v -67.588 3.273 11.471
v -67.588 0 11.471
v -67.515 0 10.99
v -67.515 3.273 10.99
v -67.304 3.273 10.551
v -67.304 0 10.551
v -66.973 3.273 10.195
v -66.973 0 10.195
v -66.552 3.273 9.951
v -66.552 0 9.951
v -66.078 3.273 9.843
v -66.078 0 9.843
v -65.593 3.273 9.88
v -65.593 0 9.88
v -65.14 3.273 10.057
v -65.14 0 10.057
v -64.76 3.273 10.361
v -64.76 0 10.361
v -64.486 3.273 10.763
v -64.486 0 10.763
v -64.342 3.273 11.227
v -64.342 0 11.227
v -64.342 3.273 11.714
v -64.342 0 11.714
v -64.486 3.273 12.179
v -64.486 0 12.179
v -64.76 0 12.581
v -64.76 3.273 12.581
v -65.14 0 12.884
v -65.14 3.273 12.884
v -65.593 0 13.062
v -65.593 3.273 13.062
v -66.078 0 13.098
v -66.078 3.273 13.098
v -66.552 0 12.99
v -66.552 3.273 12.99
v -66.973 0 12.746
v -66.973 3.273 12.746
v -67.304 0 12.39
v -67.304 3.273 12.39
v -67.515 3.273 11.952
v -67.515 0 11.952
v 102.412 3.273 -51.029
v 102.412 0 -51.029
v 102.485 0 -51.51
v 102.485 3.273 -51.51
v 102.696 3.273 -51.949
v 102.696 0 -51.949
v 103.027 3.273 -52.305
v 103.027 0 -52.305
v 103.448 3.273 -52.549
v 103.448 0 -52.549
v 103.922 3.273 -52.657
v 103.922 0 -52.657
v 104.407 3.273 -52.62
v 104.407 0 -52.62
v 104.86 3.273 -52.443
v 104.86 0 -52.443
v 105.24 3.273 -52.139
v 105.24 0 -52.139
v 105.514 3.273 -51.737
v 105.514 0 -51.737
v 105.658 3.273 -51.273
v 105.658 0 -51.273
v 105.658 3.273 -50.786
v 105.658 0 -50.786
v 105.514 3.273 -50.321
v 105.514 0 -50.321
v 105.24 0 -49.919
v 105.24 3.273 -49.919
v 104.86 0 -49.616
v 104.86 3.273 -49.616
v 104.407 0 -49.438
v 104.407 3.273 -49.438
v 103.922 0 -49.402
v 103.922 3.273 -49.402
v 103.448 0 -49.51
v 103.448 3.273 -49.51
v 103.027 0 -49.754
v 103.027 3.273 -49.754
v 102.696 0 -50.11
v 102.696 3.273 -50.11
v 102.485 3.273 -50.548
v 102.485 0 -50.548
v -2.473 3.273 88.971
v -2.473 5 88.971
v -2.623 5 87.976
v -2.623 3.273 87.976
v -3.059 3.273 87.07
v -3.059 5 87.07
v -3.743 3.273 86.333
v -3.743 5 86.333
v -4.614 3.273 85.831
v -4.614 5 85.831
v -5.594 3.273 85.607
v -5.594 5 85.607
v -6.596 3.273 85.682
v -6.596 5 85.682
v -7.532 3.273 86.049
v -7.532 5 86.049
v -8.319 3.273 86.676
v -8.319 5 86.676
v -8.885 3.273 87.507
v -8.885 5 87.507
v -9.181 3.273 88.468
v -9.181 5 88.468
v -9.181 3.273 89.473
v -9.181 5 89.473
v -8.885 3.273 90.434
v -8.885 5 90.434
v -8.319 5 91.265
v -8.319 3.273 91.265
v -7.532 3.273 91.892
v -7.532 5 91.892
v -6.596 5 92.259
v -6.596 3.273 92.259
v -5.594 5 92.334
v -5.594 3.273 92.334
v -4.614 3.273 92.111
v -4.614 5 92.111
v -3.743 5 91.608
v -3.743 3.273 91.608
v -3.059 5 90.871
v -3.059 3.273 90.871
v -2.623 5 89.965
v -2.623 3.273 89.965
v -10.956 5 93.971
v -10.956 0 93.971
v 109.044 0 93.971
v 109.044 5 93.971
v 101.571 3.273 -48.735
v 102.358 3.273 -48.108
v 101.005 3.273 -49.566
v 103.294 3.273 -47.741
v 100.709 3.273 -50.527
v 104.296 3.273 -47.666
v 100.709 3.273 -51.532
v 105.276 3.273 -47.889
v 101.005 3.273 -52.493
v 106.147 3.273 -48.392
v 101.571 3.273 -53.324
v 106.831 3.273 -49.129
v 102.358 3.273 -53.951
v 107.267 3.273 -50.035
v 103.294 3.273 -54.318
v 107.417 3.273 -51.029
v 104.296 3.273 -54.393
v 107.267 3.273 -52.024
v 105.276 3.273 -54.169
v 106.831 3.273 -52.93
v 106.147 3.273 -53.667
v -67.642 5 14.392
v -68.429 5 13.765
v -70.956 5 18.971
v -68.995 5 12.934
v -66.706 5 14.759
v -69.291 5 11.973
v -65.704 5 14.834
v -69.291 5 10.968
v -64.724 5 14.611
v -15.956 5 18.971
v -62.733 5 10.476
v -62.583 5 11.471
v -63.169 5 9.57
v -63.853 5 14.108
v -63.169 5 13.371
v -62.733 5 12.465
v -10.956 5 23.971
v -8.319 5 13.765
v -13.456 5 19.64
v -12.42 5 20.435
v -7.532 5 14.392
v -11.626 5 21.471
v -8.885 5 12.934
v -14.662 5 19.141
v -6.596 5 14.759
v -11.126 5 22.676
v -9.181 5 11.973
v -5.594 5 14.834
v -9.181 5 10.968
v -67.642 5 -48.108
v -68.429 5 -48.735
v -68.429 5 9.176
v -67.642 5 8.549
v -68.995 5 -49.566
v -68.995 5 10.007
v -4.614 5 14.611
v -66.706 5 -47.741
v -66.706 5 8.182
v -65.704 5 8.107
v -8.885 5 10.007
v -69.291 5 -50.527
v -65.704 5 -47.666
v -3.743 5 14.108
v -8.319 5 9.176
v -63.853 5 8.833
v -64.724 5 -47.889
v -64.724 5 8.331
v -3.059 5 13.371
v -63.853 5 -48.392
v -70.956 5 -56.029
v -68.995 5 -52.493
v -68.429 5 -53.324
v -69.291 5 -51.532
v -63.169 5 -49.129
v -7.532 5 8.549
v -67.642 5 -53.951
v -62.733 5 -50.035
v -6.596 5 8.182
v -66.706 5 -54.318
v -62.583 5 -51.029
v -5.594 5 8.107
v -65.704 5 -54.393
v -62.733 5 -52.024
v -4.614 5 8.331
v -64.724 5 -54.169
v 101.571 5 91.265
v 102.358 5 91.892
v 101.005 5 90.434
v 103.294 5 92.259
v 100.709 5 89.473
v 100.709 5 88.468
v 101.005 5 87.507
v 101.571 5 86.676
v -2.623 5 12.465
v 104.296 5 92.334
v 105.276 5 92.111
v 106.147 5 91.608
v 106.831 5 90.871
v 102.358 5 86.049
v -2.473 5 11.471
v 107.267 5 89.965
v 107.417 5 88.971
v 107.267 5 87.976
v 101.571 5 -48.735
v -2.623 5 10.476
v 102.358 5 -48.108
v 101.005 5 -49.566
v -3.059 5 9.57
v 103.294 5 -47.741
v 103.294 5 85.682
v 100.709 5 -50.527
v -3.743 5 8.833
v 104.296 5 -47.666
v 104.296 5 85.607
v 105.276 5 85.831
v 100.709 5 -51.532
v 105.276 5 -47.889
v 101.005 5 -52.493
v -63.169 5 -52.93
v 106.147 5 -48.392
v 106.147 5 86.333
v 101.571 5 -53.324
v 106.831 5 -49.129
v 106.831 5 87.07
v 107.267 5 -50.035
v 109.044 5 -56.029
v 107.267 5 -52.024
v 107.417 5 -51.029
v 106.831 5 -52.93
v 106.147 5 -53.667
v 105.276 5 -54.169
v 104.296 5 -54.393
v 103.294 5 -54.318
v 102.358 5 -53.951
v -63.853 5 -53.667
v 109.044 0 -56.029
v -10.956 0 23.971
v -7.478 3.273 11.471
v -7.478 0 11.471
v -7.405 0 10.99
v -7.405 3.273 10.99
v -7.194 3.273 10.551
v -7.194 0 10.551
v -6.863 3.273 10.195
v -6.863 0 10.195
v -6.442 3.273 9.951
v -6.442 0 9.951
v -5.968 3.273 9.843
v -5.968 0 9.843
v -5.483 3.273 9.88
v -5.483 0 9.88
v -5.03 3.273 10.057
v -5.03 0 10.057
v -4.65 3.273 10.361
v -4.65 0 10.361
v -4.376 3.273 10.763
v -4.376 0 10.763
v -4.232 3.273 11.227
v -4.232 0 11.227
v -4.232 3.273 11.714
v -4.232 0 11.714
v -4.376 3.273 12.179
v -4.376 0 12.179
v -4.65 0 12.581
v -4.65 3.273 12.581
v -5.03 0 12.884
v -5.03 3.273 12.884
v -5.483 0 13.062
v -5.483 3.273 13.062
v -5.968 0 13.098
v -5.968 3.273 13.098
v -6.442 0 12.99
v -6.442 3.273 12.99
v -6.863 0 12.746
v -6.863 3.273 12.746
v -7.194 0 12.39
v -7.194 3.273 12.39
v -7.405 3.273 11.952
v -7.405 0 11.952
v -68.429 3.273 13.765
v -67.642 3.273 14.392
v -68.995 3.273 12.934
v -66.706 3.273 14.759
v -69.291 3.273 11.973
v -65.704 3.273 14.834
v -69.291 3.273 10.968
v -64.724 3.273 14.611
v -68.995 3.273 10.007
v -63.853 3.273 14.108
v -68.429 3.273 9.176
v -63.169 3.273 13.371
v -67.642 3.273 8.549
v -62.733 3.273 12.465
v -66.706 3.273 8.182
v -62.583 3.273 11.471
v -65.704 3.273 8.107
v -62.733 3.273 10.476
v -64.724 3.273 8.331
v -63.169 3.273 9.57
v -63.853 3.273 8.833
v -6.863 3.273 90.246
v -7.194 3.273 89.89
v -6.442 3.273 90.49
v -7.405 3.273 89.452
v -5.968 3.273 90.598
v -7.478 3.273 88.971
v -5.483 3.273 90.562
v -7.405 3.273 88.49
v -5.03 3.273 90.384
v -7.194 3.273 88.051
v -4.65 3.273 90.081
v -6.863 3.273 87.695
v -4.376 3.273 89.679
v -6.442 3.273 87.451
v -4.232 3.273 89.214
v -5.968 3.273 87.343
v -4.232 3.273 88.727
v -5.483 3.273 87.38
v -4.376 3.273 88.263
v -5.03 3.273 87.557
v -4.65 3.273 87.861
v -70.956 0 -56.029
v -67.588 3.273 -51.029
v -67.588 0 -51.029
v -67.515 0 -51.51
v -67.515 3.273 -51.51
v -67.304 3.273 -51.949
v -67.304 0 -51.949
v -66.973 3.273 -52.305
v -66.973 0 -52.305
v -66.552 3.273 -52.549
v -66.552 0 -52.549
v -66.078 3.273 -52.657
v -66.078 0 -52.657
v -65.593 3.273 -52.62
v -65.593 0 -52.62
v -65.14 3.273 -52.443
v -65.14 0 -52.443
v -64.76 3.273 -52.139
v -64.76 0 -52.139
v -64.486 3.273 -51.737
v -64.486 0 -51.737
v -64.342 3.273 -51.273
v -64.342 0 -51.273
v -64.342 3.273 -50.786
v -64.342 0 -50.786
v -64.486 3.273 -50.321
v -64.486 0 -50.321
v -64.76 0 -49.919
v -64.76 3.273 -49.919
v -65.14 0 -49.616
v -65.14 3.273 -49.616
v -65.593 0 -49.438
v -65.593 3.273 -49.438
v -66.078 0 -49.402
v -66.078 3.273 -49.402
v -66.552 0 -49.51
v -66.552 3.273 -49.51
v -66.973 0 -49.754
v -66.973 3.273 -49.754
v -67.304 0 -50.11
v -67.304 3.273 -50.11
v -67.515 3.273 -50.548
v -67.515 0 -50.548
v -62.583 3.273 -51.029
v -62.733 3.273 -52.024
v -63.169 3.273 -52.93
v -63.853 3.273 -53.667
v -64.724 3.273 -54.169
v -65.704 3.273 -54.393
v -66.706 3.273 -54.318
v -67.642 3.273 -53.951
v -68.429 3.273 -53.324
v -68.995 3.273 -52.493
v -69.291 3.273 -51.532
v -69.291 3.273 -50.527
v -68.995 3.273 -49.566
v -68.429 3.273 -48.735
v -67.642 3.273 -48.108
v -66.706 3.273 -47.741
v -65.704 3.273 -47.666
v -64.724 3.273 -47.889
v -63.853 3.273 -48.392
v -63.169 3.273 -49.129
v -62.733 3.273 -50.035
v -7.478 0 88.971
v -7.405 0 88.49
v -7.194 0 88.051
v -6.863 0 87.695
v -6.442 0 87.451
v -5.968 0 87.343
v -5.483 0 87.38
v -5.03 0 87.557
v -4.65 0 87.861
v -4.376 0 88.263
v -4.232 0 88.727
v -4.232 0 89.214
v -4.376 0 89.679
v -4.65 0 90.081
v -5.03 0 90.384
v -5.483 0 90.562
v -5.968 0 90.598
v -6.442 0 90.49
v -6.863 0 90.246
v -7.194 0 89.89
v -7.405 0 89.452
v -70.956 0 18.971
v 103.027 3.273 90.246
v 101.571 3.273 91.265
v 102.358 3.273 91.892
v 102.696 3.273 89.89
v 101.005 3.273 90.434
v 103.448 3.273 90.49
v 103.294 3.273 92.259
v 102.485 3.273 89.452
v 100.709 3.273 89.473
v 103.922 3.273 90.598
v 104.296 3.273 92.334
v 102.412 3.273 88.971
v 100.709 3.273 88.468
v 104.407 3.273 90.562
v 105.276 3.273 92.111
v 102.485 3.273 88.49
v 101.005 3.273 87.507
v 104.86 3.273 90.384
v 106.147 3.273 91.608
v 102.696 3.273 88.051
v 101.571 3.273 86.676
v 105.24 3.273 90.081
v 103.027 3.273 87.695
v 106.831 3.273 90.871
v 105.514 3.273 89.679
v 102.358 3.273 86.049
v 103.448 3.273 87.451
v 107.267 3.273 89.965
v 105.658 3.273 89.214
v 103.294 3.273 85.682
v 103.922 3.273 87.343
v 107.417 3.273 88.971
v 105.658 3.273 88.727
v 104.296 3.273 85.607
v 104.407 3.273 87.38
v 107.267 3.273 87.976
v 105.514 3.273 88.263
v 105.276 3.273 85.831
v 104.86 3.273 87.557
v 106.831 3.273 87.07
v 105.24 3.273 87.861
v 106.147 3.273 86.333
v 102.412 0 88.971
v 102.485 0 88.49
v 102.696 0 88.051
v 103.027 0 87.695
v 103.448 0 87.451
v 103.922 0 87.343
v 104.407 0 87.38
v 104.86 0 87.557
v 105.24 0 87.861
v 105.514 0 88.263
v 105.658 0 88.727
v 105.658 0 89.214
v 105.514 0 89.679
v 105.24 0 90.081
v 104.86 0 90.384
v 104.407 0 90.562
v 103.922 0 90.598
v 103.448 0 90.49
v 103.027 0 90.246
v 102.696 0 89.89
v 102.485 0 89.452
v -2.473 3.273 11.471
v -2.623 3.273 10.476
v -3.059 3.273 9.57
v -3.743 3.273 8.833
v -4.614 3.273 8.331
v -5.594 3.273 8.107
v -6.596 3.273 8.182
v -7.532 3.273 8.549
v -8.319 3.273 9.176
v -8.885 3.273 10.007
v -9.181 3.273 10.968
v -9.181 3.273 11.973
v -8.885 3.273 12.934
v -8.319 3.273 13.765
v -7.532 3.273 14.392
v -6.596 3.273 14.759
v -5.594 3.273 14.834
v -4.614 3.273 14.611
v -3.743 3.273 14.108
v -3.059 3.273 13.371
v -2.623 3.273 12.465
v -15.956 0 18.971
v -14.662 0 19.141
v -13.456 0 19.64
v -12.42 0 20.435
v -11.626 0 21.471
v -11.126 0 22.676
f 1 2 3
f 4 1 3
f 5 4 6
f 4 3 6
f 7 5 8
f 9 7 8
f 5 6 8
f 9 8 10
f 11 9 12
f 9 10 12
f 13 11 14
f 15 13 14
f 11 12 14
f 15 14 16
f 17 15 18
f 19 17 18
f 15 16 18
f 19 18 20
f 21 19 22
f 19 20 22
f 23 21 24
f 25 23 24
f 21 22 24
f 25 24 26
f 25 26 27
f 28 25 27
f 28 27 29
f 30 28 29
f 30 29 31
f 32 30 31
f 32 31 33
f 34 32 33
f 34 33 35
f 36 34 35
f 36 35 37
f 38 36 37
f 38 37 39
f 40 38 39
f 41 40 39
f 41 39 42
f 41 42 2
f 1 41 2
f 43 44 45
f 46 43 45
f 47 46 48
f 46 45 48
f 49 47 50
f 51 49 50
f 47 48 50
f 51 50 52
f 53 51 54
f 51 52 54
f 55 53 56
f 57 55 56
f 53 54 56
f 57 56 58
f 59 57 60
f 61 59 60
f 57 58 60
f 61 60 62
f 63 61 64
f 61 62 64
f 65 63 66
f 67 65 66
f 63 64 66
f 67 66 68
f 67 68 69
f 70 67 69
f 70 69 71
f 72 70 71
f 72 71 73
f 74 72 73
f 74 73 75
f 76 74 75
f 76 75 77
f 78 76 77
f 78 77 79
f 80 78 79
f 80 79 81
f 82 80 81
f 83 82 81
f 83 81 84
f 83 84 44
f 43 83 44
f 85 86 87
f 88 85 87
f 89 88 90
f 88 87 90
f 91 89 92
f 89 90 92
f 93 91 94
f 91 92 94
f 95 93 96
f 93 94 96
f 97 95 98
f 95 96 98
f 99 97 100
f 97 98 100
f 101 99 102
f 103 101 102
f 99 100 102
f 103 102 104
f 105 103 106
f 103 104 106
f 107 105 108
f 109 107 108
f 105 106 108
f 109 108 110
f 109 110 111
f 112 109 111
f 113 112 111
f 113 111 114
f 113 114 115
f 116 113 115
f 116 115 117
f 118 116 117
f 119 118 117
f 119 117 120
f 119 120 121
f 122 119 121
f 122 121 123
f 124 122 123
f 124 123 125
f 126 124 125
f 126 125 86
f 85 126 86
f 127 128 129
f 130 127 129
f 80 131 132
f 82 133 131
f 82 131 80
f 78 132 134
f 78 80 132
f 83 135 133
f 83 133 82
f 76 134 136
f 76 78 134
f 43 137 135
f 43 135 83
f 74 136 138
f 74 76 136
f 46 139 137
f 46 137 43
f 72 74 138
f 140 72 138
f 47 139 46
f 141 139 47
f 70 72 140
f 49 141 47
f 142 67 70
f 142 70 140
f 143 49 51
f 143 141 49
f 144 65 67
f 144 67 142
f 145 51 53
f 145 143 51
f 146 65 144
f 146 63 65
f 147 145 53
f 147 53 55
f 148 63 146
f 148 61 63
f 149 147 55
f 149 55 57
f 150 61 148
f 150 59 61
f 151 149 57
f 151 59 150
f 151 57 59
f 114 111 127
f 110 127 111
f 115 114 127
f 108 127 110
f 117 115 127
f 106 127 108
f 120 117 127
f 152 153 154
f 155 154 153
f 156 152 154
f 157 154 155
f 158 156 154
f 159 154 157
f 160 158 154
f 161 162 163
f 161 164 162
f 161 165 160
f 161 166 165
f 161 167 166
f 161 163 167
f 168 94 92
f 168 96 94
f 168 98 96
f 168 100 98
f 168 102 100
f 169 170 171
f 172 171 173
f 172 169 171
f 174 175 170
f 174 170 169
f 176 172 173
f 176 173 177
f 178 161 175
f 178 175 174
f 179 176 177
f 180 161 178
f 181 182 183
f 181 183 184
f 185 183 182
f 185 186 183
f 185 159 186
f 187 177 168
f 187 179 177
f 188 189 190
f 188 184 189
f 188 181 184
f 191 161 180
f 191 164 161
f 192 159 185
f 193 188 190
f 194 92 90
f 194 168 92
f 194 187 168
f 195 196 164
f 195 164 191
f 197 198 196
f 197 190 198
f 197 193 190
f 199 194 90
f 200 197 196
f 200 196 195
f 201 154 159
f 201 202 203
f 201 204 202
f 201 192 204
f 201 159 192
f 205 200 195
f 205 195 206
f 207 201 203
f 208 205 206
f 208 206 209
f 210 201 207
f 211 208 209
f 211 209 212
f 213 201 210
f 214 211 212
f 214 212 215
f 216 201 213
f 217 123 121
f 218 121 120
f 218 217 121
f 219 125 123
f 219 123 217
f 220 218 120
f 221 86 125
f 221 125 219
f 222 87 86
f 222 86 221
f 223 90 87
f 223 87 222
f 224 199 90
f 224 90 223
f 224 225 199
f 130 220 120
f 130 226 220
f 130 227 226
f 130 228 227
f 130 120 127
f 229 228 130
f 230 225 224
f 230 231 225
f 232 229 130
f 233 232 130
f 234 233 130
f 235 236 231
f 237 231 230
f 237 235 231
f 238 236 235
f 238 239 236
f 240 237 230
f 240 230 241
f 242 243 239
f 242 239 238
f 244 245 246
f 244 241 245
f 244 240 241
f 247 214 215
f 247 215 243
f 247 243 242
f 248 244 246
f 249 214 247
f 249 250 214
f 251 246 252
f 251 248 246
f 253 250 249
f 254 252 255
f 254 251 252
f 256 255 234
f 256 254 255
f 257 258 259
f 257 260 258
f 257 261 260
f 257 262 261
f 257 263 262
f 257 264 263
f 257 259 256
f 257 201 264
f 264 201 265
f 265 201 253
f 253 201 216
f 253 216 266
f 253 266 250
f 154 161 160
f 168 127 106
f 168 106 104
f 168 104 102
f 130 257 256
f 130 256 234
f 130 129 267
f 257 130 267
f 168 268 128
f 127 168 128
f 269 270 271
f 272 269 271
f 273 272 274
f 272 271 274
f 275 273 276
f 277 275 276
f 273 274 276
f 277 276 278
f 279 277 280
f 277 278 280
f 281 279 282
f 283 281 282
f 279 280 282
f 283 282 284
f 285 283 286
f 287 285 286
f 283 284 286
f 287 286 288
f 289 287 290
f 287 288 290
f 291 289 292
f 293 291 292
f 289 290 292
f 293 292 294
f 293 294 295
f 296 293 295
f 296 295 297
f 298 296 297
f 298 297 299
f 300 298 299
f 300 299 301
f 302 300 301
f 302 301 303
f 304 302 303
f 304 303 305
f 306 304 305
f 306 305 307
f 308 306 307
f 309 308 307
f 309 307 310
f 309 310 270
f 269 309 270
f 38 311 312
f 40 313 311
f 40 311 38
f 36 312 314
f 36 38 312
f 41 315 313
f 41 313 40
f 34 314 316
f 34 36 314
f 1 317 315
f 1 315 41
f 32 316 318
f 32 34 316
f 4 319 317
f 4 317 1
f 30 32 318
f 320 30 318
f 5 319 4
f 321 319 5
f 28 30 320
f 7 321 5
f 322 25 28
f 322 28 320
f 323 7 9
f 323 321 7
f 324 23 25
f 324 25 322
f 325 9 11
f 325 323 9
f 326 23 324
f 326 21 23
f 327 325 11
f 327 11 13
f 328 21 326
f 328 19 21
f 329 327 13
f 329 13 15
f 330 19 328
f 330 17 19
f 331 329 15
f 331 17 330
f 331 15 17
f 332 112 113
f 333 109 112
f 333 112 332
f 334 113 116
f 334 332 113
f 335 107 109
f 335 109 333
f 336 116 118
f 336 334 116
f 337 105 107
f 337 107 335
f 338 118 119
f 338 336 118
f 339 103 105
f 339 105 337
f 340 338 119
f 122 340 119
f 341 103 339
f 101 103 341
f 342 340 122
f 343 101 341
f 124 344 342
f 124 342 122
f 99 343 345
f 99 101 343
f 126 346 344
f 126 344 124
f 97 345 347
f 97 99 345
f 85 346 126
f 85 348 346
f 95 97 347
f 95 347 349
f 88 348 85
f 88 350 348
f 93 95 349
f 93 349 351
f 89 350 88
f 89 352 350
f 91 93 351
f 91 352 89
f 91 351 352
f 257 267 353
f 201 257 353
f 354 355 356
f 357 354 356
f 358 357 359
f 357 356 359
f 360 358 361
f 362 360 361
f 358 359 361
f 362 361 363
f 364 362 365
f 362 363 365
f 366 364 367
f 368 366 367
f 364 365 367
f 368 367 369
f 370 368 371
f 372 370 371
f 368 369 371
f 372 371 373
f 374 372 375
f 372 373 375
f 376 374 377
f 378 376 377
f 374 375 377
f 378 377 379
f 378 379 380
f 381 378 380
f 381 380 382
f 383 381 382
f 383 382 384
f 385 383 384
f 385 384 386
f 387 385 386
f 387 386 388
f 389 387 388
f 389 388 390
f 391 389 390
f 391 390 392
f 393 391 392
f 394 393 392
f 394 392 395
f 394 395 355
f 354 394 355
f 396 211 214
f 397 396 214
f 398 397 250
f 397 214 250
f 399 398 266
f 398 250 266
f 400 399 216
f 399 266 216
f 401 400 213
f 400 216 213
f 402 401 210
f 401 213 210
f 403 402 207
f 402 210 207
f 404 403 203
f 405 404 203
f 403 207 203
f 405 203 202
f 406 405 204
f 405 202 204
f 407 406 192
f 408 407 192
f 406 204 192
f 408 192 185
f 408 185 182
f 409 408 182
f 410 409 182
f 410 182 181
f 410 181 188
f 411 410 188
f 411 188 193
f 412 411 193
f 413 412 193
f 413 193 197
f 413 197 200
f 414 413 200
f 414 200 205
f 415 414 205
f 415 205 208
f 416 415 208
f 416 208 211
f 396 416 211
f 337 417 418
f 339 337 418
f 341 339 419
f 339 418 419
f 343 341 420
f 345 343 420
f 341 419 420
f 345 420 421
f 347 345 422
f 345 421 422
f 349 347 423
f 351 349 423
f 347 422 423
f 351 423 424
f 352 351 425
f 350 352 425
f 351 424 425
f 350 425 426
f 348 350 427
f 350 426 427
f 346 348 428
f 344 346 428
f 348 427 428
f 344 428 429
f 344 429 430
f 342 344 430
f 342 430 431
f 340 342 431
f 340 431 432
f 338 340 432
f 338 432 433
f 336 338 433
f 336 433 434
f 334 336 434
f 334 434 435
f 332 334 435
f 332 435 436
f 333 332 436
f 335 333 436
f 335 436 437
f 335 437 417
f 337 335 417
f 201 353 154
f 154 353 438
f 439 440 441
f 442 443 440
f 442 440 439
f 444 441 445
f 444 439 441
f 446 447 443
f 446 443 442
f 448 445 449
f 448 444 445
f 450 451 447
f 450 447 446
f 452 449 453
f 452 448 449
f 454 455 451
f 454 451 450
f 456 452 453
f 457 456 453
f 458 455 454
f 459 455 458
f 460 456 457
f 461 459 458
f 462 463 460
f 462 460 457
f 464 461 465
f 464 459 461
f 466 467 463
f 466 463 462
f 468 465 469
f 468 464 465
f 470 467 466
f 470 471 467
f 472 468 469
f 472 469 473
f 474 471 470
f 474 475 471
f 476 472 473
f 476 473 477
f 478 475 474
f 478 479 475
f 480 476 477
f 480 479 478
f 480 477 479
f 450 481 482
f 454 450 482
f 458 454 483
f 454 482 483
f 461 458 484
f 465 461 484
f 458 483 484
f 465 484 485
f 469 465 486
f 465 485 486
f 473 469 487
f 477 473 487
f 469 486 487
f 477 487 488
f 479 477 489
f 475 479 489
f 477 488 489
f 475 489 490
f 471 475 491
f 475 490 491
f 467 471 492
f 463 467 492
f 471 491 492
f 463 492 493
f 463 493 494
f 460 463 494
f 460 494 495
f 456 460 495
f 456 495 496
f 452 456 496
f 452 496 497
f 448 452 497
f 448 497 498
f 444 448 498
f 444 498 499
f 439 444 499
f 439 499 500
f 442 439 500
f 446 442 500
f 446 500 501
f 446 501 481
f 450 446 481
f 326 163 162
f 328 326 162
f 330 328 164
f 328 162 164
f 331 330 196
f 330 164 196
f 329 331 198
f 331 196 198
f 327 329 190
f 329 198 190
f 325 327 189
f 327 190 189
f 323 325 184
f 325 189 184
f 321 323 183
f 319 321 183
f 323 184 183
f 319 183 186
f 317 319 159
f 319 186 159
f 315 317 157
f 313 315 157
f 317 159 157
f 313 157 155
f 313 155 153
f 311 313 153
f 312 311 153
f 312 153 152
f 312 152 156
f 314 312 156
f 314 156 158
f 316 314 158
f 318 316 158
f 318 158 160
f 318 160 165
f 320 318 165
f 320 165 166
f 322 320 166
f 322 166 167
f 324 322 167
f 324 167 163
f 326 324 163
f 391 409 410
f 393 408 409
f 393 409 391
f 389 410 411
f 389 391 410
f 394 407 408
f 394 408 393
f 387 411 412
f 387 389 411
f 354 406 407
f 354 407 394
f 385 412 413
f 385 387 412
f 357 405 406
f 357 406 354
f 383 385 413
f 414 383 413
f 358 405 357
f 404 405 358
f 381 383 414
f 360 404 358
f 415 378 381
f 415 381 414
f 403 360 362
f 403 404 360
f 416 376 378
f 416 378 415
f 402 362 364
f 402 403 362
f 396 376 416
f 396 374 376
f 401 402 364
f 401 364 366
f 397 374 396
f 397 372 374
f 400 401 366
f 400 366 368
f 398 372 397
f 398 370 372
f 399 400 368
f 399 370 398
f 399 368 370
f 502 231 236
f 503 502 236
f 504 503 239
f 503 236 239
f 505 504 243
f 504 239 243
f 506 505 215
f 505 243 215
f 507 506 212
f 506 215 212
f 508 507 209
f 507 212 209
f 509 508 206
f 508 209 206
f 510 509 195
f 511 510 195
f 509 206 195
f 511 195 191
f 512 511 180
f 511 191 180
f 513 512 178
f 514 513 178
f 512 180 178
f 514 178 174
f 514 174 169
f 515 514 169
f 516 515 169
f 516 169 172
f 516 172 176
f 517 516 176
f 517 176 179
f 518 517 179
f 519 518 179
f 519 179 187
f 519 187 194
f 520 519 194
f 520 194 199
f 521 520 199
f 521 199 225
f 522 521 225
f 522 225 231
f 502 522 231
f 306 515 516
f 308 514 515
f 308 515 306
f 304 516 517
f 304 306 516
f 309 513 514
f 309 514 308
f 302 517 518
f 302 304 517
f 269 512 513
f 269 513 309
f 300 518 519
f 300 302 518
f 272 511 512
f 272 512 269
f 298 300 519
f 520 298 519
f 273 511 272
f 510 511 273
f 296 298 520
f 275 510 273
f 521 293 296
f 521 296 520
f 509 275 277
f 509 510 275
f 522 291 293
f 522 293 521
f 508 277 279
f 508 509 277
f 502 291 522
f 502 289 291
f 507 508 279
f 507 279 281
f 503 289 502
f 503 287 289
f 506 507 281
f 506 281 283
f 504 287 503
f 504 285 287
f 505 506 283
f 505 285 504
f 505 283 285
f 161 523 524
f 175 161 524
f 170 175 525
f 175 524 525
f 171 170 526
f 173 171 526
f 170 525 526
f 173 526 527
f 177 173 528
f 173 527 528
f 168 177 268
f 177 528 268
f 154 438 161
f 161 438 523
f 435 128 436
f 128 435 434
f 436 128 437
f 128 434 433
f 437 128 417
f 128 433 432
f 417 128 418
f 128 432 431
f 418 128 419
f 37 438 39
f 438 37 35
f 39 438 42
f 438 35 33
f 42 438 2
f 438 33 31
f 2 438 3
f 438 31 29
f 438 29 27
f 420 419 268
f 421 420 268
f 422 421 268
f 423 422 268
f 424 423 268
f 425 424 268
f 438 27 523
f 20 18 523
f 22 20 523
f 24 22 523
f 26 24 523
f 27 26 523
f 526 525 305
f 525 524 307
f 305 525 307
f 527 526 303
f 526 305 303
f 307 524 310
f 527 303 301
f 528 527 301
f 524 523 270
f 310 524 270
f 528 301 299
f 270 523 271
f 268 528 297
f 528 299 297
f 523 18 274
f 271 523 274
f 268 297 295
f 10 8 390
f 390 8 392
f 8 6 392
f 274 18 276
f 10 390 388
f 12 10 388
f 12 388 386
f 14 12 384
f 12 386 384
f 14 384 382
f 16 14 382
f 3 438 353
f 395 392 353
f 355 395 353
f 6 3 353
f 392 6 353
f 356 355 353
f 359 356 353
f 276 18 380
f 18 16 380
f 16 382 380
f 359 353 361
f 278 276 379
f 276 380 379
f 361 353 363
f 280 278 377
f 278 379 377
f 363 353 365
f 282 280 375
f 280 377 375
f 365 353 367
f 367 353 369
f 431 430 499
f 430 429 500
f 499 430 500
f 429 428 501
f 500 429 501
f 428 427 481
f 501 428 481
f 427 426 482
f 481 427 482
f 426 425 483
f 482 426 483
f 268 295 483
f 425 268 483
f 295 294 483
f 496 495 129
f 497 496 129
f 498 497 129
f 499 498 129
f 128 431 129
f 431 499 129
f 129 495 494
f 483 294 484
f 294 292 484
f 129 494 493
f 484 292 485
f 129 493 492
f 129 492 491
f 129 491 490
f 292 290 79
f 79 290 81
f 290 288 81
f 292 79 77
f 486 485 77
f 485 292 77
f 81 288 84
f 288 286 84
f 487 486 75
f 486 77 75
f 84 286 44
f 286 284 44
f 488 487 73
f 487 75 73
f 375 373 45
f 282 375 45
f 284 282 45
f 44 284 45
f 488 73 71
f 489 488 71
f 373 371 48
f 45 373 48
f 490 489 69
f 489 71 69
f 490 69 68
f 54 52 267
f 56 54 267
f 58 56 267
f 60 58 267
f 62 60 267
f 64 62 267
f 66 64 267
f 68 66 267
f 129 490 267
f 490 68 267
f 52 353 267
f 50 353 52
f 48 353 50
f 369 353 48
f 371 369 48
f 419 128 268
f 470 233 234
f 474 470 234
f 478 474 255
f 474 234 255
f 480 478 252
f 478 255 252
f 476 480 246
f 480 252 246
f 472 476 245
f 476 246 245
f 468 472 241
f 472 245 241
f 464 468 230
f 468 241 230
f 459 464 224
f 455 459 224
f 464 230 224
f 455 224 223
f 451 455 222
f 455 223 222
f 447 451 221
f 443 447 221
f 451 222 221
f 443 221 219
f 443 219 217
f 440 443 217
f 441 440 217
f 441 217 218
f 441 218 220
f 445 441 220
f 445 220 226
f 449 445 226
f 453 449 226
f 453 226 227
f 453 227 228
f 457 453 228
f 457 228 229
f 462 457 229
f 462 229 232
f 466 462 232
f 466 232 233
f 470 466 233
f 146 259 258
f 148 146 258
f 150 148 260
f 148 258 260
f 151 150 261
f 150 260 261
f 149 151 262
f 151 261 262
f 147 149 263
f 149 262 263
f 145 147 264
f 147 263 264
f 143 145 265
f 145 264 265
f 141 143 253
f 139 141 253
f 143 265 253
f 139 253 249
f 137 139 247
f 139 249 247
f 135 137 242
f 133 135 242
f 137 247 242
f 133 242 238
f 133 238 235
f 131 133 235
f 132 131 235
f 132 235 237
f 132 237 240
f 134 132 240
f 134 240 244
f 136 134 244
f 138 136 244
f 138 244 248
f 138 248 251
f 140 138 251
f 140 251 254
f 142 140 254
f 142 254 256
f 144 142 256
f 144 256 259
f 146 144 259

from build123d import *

# Parameters (mm, degrees)
BOSS_EXTRUDE1_DEPTH                                 = 5
CBORE_FOR_4_BINDING_HEAD_MACHINE_SCREW1_D           = 3.2639
CBORE_FOR_4_BINDING_HEAD_MACHINE_SCREW1_DEPTH       = 5
CBORE_FOR_4_BINDING_HEAD_MACHINE_SCREW1_CBORE_D     = 6.74624
CBORE_FOR_4_BINDING_HEAD_MACHINE_SCREW1_CBORE_DEPTH = 1.7272


with BuildPart() as part:
    # Sketch1 → Boss-Extrude1 (new body)
    with BuildSketch(Plane(origin=(0, 0, 0), x_dir=(1, 0, 0), z_dir=(0, 1, 0))):
        with BuildLine():
            Line((109.044117647, 56.029411765), (-70.955882353, 56.029411765))
            Line((-70.955882353, 56.029411765), (-70.955882353, -18.970588235))
            Line((-70.955882353, -18.970588235), (-15.955882353, -18.970588235))
            ThreePointArc((-15.955882353, -18.970588235), (-12.420348447, -20.435054329), (-10.955882353, -23.970588235))
            Line((-10.955882353, -23.970588235), (-10.955882353, -93.970588235))
            Line((-10.955882353, -93.970588235), (109.044117647, -93.970588235))
            Line((109.044117647, -93.970588235), (109.044117647, -18.970588235))
            Line((109.044117647, -18.970588235), (109.044117647, 56.029411765))
        make_face()
    extrude(amount=BOSS_EXTRUDE1_DEPTH)

    # CBORE for #4 Binding Head Machine Screw1
    with Locations(Plane(origin=(0, 5, 0), x_dir=(1, 0, 0), z_dir=(0, 1, 0))):
        with Locations((-65.955882353, 51.029411765), (-65.955882353, -11.470588235), (-5.845882353, -11.470588235), (-5.845882353, -88.970588235), (104.044117647, -88.970588235), (104.044117647, 51.029411765)):
            CounterBoreHole(CBORE_FOR_4_BINDING_HEAD_MACHINE_SCREW1_D / 2, CBORE_FOR_4_BINDING_HEAD_MACHINE_SCREW1_CBORE_D / 2, CBORE_FOR_4_BINDING_HEAD_MACHINE_SCREW1_CBORE_DEPTH, depth=CBORE_FOR_4_BINDING_HEAD_MACHINE_SCREW1_DEPTH)


solid = part.part
